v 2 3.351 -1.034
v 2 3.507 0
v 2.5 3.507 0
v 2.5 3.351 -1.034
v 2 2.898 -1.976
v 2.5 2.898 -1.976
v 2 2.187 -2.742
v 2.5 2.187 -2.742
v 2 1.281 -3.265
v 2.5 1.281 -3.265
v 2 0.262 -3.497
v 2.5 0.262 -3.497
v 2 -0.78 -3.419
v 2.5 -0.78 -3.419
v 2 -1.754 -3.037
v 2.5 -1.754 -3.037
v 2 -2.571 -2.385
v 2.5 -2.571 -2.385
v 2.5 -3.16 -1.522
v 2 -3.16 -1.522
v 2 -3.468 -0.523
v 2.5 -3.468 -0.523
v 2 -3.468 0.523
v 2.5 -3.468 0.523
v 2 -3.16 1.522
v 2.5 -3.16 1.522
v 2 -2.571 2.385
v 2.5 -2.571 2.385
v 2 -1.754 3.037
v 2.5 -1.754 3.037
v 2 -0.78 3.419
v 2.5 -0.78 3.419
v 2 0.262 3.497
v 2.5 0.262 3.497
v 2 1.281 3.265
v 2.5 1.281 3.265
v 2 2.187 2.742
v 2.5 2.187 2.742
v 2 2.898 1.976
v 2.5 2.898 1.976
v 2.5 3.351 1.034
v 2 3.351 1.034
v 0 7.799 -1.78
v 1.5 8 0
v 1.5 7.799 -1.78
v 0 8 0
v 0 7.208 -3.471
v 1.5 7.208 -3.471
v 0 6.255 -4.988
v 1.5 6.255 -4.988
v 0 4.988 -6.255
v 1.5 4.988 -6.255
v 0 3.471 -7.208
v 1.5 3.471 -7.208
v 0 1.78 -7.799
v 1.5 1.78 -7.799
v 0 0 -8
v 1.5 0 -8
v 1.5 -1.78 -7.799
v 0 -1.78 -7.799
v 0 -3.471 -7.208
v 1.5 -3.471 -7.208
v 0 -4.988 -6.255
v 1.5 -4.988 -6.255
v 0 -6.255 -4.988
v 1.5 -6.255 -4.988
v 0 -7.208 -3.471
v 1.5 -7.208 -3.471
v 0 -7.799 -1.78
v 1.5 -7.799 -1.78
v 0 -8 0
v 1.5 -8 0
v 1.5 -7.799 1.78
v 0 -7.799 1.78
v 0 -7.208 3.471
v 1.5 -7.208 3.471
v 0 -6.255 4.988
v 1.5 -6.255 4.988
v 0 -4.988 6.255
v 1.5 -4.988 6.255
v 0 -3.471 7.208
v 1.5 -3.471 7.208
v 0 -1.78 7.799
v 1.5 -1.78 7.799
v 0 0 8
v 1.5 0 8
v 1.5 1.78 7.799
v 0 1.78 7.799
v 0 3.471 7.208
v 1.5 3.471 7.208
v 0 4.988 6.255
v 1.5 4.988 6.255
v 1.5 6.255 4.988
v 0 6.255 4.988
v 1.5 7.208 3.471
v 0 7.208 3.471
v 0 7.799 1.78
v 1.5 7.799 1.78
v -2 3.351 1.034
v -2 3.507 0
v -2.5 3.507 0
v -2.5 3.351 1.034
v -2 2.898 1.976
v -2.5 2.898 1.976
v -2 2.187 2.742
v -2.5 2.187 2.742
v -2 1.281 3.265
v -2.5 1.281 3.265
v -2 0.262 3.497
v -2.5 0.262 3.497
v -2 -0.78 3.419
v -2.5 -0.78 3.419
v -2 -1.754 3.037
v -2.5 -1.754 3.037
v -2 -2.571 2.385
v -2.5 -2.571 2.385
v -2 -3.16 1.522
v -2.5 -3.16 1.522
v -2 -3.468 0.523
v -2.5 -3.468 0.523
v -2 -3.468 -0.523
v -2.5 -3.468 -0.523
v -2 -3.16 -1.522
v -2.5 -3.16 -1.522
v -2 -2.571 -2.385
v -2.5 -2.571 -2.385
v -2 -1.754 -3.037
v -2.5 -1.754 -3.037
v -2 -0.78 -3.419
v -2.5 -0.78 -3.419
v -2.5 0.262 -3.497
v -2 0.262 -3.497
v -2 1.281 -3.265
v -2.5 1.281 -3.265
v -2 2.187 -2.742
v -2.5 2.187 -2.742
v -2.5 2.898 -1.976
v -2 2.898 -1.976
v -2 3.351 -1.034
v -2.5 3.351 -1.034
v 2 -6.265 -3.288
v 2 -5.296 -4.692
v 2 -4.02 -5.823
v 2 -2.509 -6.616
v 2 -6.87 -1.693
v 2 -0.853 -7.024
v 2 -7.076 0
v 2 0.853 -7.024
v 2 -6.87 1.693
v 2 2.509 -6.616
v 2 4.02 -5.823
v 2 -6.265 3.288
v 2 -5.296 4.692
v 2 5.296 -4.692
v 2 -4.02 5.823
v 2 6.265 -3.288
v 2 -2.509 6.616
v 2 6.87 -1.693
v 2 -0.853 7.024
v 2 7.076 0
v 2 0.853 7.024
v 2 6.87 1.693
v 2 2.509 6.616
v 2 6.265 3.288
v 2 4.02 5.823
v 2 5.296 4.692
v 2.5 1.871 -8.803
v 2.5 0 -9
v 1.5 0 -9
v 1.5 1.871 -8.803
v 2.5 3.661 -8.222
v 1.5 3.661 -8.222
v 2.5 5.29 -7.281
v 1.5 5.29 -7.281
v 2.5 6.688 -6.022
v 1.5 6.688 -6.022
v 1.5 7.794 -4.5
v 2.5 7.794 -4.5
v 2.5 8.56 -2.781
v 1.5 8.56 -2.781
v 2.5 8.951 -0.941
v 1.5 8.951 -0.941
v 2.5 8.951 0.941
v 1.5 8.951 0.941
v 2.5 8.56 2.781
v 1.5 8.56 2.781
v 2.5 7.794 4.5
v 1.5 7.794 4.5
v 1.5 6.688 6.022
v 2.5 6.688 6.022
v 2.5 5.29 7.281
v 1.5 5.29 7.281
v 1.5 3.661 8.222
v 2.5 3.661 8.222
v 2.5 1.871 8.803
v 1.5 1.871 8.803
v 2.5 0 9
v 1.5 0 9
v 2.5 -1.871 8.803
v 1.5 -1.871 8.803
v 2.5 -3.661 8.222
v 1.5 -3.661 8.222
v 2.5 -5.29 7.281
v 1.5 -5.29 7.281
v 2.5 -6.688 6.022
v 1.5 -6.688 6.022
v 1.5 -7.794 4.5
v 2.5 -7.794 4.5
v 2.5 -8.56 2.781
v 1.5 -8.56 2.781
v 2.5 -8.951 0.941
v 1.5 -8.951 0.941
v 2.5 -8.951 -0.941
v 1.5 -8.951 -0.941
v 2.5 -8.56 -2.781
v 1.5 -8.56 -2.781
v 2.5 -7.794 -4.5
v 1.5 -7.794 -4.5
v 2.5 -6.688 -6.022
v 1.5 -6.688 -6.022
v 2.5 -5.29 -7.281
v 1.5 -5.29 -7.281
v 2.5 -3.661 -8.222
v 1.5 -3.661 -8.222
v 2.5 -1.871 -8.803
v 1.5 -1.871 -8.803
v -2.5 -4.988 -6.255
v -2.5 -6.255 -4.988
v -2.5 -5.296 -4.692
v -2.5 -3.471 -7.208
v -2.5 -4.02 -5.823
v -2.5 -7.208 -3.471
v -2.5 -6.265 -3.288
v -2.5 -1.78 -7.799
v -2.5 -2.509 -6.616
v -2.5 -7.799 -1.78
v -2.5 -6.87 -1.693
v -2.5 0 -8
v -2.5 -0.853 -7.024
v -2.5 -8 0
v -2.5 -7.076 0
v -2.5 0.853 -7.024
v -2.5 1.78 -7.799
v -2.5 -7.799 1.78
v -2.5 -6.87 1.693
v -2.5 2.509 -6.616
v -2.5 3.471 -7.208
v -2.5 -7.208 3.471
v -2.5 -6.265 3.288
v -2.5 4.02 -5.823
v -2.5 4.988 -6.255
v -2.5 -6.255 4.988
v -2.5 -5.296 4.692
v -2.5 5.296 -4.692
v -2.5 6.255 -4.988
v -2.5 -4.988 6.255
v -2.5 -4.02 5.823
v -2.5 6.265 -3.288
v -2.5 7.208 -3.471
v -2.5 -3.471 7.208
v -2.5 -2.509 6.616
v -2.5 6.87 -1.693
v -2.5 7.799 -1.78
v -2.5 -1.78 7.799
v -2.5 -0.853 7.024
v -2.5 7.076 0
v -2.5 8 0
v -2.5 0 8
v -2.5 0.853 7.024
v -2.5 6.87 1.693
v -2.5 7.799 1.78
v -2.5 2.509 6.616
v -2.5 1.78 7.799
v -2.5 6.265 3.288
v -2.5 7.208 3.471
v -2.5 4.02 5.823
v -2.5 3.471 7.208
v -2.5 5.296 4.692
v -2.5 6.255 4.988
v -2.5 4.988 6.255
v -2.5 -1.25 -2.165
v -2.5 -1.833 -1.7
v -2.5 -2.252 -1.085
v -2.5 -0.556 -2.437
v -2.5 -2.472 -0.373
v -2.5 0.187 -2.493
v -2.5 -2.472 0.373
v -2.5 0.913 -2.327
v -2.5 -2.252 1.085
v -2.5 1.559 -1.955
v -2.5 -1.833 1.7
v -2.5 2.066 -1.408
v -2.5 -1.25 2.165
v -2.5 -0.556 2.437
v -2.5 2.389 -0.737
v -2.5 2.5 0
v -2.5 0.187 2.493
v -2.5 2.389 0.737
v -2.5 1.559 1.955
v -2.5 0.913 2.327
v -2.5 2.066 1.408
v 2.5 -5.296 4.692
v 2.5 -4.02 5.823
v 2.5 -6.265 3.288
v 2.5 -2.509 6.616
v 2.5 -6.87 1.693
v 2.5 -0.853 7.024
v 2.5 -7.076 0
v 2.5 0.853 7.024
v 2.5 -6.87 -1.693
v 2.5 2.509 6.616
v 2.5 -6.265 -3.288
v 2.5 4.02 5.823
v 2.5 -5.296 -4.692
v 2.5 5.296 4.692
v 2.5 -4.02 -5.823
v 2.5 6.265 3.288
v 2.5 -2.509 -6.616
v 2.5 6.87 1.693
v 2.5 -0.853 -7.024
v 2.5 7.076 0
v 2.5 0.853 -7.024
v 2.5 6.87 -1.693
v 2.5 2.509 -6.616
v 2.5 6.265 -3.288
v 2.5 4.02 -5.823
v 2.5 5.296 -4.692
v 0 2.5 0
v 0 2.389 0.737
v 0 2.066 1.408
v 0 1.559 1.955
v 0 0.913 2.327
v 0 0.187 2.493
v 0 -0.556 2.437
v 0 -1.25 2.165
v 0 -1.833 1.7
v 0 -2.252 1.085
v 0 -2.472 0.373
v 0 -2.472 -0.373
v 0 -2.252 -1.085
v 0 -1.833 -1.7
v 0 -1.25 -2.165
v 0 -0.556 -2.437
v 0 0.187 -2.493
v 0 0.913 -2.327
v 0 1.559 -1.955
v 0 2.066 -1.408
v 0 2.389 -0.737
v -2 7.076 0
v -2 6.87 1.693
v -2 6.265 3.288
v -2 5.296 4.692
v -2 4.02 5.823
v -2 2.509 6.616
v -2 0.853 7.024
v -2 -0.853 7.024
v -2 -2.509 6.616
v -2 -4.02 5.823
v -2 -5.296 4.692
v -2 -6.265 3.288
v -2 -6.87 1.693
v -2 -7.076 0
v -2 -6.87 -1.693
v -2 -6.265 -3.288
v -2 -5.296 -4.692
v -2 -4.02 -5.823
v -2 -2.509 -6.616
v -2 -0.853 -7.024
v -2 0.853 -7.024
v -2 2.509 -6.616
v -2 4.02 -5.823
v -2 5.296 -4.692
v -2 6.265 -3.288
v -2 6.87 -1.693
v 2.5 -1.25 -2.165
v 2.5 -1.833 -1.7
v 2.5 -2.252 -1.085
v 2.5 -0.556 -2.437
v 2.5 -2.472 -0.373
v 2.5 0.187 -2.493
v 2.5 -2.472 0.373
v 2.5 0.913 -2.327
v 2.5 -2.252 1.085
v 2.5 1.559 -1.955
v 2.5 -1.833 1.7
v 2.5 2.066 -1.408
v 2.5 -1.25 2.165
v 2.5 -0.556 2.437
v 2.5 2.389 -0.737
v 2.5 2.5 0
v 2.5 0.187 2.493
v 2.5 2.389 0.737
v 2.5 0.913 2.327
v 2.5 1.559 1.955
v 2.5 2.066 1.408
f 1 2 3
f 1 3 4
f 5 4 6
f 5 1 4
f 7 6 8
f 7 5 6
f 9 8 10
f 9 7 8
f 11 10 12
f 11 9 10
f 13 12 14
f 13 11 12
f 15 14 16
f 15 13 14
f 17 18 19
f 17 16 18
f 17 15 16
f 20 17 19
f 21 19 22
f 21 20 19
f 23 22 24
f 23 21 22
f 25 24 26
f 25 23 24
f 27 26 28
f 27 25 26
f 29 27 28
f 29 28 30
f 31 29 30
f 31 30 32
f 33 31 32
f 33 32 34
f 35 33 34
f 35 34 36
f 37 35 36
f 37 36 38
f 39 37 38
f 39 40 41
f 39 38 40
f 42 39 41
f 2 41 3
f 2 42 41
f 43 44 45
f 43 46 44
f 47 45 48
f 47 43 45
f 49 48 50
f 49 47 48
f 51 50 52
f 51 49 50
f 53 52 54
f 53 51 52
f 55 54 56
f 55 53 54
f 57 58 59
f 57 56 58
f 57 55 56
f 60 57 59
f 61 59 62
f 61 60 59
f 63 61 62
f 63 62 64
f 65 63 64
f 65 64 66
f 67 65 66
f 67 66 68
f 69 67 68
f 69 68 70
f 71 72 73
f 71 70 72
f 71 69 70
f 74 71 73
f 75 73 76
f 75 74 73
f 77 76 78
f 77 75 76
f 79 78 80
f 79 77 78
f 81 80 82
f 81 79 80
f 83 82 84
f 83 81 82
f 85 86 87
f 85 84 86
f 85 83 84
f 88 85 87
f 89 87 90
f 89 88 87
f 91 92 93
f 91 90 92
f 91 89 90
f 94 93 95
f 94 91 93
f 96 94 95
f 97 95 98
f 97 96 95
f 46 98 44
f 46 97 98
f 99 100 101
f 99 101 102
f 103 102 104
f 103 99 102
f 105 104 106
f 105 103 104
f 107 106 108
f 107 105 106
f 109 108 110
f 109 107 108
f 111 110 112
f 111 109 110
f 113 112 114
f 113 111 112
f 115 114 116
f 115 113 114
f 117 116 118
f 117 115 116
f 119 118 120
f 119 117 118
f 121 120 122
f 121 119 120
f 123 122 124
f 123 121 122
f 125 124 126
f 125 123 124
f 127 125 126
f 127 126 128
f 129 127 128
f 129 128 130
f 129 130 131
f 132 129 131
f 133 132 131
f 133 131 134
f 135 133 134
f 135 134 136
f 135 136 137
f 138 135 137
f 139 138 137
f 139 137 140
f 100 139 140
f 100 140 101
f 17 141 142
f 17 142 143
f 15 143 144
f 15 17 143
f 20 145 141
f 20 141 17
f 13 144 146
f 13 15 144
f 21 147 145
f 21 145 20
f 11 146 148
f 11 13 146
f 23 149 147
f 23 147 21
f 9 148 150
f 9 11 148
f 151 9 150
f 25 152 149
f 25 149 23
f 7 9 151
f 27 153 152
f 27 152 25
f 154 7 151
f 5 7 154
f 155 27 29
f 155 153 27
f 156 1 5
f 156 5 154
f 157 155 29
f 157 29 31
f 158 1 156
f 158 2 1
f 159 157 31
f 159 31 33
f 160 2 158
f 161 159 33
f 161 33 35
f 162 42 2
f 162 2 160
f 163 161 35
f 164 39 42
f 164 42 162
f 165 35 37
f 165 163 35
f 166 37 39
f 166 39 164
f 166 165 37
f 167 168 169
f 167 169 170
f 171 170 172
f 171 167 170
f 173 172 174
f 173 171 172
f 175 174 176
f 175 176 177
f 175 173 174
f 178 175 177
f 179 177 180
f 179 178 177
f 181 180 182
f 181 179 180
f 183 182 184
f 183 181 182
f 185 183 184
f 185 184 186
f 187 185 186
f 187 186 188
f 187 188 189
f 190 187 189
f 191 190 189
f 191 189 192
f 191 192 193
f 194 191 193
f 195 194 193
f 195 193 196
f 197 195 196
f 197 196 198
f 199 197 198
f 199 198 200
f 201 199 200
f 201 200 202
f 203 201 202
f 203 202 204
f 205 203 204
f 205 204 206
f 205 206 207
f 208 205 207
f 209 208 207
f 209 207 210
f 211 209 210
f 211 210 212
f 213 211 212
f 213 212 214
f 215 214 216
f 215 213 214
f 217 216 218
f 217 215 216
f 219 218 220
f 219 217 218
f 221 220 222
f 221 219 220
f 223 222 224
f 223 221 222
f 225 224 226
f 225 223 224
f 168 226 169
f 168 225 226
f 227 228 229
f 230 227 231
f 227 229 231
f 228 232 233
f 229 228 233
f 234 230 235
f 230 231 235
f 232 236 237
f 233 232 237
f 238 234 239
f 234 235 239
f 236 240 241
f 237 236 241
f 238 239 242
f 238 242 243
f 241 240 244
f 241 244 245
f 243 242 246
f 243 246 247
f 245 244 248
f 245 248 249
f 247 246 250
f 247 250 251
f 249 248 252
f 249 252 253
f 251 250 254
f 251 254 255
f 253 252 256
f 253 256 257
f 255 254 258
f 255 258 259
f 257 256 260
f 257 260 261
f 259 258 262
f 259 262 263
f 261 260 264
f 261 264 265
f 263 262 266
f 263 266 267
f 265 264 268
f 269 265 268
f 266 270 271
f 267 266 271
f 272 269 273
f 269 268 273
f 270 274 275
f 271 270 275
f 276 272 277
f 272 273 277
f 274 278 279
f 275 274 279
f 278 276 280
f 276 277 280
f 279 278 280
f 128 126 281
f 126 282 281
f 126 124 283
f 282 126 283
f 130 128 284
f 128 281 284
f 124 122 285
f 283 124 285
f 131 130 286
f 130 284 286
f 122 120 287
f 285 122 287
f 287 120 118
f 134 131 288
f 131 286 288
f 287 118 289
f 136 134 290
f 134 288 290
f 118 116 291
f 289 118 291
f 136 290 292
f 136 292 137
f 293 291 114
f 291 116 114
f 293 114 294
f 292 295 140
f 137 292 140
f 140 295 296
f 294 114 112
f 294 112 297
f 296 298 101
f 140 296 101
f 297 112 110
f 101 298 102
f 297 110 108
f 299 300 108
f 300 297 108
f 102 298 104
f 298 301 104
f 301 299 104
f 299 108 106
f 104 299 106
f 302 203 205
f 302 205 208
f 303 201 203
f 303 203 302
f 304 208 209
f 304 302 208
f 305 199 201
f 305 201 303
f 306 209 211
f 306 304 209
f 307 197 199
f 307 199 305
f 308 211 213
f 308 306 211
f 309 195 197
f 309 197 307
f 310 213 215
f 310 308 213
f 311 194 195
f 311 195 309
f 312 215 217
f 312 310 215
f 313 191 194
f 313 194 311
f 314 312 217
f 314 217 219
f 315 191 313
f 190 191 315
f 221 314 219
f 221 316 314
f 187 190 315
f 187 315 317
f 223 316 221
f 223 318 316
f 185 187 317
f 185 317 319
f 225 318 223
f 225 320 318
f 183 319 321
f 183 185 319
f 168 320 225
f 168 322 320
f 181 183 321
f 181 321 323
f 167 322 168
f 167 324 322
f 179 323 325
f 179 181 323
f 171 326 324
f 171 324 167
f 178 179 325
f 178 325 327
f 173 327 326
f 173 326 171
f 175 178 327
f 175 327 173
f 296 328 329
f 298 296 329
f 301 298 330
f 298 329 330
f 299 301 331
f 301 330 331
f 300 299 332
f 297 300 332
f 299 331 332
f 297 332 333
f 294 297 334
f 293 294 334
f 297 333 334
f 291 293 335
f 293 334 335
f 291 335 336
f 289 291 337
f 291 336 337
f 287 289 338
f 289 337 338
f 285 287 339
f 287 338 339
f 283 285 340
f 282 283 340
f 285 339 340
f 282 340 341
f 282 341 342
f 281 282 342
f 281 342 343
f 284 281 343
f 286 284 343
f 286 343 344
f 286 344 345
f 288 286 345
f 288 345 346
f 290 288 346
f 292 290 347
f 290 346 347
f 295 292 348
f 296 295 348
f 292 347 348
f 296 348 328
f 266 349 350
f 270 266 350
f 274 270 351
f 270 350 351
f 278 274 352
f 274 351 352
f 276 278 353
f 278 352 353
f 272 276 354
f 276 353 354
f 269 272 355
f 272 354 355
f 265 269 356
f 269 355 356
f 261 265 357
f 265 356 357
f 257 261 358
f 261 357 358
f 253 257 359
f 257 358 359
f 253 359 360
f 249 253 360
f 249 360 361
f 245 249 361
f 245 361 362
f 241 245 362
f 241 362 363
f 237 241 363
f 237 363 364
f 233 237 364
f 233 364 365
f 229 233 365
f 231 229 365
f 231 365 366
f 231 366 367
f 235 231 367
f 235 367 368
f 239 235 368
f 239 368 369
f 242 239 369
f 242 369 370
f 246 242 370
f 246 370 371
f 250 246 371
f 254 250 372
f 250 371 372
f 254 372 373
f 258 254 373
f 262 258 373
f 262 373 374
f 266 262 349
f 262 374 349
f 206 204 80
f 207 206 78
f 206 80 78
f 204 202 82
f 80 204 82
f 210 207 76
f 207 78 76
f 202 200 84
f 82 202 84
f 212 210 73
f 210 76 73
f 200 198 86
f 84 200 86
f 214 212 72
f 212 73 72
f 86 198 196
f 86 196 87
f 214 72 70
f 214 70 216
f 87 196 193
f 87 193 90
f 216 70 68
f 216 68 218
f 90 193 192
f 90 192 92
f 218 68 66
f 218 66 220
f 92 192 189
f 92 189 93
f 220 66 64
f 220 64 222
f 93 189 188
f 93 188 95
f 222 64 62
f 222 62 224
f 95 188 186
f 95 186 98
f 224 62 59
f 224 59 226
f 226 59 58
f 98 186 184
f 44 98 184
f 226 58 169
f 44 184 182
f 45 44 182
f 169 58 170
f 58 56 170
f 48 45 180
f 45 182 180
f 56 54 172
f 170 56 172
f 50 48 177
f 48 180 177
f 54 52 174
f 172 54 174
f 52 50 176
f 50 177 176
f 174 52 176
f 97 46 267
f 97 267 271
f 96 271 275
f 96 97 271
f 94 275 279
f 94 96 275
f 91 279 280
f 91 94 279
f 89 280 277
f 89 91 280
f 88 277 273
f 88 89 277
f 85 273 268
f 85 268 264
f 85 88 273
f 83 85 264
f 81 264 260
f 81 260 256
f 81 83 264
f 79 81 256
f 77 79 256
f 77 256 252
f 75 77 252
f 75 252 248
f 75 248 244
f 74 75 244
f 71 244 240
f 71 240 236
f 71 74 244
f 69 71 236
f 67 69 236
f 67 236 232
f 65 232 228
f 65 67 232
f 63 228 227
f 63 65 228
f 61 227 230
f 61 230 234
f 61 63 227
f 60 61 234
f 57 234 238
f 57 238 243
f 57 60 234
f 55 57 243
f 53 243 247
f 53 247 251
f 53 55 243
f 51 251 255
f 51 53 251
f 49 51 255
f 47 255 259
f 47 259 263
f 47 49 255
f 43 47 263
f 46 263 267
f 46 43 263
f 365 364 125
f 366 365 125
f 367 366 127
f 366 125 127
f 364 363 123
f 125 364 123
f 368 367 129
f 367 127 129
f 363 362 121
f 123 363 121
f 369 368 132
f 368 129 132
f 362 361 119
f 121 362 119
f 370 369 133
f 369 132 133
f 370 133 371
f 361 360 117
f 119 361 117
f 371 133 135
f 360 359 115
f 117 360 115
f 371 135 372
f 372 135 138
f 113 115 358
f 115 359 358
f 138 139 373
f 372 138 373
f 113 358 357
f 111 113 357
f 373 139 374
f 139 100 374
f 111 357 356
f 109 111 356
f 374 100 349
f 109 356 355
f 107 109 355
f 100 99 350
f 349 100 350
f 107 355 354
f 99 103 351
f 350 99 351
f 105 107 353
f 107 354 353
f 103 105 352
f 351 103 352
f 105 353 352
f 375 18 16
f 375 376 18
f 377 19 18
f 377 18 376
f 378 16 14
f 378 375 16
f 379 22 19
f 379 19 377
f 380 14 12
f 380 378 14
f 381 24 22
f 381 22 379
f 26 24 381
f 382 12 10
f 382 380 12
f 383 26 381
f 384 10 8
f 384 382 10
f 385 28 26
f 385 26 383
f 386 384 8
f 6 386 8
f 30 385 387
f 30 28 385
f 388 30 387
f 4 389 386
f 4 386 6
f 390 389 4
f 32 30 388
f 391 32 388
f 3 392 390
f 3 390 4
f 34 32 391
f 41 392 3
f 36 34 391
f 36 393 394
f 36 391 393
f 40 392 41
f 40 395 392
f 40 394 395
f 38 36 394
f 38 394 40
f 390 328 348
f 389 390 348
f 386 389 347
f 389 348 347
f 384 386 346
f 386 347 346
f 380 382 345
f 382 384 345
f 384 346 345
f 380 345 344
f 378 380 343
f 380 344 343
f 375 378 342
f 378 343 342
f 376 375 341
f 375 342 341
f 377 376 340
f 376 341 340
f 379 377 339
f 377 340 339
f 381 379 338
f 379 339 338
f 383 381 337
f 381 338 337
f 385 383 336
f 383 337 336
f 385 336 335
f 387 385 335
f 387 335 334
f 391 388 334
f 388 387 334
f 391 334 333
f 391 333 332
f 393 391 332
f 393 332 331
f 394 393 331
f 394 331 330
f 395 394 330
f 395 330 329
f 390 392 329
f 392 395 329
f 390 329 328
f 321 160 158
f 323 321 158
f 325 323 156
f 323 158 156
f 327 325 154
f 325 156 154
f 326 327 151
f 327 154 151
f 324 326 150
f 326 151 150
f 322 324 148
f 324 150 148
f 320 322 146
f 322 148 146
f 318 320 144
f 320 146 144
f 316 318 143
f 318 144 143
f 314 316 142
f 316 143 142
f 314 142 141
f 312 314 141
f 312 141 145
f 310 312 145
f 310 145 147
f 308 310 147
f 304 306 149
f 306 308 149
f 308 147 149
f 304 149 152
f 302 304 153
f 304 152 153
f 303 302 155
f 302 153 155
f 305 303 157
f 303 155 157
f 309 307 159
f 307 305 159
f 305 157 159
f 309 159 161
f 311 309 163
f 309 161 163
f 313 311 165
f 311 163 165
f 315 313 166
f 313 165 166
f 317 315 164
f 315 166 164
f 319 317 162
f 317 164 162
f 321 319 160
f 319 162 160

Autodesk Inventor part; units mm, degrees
ref_plane "YZ Plane" through (0, 0, 0) normal (1, 0, 0) x (0, 1, 0)
ref_plane "XZ Plane" through (0, 0, 0) normal (0, 1, 0) x (-1, 0, 0)
ref_plane "XY Plane" through (0, 0, 0) normal (0, 0, 1) x (1, 0, 0)
sketch "Эскиз1" plane through (0, 0, 0) normal (1, 0, 0) x (0, 1, 0)
  circle A0 centre (0, 0) radius 8
  circle A1 centre (0, 0) radius 2.5
  circle A2 centre (0, 0) radius 9
  circle A3 centre (0, 0) radius 7.0758
  circle A4 centre (0, 0) radius 3.5071
  dimension "d0" = 16
  dimension "d1" = 5
  dimension "d2" = 18
extrude "Выдавливание1" add sketch "Эскиз1" along normal mid plane 5 contours A0 | A4
extrude "Выдавливание2" add sketch "Эскиз1" along normal mid plane 4 contours A3
sketch "Эскиз2" plane through (2.5, 0, 0) normal (1, 0, 0) x (0, 0, -1)
  circle A0 centre (0, 0) radius 9
  circle A1 centre (0, 0) radius 8
  dimension "d7" = 18
  dimension "d8" = 16
extrude "Выдавливание3" add sketch "Эскиз2" against normal blind 1
properties part number "F625ZZ"
